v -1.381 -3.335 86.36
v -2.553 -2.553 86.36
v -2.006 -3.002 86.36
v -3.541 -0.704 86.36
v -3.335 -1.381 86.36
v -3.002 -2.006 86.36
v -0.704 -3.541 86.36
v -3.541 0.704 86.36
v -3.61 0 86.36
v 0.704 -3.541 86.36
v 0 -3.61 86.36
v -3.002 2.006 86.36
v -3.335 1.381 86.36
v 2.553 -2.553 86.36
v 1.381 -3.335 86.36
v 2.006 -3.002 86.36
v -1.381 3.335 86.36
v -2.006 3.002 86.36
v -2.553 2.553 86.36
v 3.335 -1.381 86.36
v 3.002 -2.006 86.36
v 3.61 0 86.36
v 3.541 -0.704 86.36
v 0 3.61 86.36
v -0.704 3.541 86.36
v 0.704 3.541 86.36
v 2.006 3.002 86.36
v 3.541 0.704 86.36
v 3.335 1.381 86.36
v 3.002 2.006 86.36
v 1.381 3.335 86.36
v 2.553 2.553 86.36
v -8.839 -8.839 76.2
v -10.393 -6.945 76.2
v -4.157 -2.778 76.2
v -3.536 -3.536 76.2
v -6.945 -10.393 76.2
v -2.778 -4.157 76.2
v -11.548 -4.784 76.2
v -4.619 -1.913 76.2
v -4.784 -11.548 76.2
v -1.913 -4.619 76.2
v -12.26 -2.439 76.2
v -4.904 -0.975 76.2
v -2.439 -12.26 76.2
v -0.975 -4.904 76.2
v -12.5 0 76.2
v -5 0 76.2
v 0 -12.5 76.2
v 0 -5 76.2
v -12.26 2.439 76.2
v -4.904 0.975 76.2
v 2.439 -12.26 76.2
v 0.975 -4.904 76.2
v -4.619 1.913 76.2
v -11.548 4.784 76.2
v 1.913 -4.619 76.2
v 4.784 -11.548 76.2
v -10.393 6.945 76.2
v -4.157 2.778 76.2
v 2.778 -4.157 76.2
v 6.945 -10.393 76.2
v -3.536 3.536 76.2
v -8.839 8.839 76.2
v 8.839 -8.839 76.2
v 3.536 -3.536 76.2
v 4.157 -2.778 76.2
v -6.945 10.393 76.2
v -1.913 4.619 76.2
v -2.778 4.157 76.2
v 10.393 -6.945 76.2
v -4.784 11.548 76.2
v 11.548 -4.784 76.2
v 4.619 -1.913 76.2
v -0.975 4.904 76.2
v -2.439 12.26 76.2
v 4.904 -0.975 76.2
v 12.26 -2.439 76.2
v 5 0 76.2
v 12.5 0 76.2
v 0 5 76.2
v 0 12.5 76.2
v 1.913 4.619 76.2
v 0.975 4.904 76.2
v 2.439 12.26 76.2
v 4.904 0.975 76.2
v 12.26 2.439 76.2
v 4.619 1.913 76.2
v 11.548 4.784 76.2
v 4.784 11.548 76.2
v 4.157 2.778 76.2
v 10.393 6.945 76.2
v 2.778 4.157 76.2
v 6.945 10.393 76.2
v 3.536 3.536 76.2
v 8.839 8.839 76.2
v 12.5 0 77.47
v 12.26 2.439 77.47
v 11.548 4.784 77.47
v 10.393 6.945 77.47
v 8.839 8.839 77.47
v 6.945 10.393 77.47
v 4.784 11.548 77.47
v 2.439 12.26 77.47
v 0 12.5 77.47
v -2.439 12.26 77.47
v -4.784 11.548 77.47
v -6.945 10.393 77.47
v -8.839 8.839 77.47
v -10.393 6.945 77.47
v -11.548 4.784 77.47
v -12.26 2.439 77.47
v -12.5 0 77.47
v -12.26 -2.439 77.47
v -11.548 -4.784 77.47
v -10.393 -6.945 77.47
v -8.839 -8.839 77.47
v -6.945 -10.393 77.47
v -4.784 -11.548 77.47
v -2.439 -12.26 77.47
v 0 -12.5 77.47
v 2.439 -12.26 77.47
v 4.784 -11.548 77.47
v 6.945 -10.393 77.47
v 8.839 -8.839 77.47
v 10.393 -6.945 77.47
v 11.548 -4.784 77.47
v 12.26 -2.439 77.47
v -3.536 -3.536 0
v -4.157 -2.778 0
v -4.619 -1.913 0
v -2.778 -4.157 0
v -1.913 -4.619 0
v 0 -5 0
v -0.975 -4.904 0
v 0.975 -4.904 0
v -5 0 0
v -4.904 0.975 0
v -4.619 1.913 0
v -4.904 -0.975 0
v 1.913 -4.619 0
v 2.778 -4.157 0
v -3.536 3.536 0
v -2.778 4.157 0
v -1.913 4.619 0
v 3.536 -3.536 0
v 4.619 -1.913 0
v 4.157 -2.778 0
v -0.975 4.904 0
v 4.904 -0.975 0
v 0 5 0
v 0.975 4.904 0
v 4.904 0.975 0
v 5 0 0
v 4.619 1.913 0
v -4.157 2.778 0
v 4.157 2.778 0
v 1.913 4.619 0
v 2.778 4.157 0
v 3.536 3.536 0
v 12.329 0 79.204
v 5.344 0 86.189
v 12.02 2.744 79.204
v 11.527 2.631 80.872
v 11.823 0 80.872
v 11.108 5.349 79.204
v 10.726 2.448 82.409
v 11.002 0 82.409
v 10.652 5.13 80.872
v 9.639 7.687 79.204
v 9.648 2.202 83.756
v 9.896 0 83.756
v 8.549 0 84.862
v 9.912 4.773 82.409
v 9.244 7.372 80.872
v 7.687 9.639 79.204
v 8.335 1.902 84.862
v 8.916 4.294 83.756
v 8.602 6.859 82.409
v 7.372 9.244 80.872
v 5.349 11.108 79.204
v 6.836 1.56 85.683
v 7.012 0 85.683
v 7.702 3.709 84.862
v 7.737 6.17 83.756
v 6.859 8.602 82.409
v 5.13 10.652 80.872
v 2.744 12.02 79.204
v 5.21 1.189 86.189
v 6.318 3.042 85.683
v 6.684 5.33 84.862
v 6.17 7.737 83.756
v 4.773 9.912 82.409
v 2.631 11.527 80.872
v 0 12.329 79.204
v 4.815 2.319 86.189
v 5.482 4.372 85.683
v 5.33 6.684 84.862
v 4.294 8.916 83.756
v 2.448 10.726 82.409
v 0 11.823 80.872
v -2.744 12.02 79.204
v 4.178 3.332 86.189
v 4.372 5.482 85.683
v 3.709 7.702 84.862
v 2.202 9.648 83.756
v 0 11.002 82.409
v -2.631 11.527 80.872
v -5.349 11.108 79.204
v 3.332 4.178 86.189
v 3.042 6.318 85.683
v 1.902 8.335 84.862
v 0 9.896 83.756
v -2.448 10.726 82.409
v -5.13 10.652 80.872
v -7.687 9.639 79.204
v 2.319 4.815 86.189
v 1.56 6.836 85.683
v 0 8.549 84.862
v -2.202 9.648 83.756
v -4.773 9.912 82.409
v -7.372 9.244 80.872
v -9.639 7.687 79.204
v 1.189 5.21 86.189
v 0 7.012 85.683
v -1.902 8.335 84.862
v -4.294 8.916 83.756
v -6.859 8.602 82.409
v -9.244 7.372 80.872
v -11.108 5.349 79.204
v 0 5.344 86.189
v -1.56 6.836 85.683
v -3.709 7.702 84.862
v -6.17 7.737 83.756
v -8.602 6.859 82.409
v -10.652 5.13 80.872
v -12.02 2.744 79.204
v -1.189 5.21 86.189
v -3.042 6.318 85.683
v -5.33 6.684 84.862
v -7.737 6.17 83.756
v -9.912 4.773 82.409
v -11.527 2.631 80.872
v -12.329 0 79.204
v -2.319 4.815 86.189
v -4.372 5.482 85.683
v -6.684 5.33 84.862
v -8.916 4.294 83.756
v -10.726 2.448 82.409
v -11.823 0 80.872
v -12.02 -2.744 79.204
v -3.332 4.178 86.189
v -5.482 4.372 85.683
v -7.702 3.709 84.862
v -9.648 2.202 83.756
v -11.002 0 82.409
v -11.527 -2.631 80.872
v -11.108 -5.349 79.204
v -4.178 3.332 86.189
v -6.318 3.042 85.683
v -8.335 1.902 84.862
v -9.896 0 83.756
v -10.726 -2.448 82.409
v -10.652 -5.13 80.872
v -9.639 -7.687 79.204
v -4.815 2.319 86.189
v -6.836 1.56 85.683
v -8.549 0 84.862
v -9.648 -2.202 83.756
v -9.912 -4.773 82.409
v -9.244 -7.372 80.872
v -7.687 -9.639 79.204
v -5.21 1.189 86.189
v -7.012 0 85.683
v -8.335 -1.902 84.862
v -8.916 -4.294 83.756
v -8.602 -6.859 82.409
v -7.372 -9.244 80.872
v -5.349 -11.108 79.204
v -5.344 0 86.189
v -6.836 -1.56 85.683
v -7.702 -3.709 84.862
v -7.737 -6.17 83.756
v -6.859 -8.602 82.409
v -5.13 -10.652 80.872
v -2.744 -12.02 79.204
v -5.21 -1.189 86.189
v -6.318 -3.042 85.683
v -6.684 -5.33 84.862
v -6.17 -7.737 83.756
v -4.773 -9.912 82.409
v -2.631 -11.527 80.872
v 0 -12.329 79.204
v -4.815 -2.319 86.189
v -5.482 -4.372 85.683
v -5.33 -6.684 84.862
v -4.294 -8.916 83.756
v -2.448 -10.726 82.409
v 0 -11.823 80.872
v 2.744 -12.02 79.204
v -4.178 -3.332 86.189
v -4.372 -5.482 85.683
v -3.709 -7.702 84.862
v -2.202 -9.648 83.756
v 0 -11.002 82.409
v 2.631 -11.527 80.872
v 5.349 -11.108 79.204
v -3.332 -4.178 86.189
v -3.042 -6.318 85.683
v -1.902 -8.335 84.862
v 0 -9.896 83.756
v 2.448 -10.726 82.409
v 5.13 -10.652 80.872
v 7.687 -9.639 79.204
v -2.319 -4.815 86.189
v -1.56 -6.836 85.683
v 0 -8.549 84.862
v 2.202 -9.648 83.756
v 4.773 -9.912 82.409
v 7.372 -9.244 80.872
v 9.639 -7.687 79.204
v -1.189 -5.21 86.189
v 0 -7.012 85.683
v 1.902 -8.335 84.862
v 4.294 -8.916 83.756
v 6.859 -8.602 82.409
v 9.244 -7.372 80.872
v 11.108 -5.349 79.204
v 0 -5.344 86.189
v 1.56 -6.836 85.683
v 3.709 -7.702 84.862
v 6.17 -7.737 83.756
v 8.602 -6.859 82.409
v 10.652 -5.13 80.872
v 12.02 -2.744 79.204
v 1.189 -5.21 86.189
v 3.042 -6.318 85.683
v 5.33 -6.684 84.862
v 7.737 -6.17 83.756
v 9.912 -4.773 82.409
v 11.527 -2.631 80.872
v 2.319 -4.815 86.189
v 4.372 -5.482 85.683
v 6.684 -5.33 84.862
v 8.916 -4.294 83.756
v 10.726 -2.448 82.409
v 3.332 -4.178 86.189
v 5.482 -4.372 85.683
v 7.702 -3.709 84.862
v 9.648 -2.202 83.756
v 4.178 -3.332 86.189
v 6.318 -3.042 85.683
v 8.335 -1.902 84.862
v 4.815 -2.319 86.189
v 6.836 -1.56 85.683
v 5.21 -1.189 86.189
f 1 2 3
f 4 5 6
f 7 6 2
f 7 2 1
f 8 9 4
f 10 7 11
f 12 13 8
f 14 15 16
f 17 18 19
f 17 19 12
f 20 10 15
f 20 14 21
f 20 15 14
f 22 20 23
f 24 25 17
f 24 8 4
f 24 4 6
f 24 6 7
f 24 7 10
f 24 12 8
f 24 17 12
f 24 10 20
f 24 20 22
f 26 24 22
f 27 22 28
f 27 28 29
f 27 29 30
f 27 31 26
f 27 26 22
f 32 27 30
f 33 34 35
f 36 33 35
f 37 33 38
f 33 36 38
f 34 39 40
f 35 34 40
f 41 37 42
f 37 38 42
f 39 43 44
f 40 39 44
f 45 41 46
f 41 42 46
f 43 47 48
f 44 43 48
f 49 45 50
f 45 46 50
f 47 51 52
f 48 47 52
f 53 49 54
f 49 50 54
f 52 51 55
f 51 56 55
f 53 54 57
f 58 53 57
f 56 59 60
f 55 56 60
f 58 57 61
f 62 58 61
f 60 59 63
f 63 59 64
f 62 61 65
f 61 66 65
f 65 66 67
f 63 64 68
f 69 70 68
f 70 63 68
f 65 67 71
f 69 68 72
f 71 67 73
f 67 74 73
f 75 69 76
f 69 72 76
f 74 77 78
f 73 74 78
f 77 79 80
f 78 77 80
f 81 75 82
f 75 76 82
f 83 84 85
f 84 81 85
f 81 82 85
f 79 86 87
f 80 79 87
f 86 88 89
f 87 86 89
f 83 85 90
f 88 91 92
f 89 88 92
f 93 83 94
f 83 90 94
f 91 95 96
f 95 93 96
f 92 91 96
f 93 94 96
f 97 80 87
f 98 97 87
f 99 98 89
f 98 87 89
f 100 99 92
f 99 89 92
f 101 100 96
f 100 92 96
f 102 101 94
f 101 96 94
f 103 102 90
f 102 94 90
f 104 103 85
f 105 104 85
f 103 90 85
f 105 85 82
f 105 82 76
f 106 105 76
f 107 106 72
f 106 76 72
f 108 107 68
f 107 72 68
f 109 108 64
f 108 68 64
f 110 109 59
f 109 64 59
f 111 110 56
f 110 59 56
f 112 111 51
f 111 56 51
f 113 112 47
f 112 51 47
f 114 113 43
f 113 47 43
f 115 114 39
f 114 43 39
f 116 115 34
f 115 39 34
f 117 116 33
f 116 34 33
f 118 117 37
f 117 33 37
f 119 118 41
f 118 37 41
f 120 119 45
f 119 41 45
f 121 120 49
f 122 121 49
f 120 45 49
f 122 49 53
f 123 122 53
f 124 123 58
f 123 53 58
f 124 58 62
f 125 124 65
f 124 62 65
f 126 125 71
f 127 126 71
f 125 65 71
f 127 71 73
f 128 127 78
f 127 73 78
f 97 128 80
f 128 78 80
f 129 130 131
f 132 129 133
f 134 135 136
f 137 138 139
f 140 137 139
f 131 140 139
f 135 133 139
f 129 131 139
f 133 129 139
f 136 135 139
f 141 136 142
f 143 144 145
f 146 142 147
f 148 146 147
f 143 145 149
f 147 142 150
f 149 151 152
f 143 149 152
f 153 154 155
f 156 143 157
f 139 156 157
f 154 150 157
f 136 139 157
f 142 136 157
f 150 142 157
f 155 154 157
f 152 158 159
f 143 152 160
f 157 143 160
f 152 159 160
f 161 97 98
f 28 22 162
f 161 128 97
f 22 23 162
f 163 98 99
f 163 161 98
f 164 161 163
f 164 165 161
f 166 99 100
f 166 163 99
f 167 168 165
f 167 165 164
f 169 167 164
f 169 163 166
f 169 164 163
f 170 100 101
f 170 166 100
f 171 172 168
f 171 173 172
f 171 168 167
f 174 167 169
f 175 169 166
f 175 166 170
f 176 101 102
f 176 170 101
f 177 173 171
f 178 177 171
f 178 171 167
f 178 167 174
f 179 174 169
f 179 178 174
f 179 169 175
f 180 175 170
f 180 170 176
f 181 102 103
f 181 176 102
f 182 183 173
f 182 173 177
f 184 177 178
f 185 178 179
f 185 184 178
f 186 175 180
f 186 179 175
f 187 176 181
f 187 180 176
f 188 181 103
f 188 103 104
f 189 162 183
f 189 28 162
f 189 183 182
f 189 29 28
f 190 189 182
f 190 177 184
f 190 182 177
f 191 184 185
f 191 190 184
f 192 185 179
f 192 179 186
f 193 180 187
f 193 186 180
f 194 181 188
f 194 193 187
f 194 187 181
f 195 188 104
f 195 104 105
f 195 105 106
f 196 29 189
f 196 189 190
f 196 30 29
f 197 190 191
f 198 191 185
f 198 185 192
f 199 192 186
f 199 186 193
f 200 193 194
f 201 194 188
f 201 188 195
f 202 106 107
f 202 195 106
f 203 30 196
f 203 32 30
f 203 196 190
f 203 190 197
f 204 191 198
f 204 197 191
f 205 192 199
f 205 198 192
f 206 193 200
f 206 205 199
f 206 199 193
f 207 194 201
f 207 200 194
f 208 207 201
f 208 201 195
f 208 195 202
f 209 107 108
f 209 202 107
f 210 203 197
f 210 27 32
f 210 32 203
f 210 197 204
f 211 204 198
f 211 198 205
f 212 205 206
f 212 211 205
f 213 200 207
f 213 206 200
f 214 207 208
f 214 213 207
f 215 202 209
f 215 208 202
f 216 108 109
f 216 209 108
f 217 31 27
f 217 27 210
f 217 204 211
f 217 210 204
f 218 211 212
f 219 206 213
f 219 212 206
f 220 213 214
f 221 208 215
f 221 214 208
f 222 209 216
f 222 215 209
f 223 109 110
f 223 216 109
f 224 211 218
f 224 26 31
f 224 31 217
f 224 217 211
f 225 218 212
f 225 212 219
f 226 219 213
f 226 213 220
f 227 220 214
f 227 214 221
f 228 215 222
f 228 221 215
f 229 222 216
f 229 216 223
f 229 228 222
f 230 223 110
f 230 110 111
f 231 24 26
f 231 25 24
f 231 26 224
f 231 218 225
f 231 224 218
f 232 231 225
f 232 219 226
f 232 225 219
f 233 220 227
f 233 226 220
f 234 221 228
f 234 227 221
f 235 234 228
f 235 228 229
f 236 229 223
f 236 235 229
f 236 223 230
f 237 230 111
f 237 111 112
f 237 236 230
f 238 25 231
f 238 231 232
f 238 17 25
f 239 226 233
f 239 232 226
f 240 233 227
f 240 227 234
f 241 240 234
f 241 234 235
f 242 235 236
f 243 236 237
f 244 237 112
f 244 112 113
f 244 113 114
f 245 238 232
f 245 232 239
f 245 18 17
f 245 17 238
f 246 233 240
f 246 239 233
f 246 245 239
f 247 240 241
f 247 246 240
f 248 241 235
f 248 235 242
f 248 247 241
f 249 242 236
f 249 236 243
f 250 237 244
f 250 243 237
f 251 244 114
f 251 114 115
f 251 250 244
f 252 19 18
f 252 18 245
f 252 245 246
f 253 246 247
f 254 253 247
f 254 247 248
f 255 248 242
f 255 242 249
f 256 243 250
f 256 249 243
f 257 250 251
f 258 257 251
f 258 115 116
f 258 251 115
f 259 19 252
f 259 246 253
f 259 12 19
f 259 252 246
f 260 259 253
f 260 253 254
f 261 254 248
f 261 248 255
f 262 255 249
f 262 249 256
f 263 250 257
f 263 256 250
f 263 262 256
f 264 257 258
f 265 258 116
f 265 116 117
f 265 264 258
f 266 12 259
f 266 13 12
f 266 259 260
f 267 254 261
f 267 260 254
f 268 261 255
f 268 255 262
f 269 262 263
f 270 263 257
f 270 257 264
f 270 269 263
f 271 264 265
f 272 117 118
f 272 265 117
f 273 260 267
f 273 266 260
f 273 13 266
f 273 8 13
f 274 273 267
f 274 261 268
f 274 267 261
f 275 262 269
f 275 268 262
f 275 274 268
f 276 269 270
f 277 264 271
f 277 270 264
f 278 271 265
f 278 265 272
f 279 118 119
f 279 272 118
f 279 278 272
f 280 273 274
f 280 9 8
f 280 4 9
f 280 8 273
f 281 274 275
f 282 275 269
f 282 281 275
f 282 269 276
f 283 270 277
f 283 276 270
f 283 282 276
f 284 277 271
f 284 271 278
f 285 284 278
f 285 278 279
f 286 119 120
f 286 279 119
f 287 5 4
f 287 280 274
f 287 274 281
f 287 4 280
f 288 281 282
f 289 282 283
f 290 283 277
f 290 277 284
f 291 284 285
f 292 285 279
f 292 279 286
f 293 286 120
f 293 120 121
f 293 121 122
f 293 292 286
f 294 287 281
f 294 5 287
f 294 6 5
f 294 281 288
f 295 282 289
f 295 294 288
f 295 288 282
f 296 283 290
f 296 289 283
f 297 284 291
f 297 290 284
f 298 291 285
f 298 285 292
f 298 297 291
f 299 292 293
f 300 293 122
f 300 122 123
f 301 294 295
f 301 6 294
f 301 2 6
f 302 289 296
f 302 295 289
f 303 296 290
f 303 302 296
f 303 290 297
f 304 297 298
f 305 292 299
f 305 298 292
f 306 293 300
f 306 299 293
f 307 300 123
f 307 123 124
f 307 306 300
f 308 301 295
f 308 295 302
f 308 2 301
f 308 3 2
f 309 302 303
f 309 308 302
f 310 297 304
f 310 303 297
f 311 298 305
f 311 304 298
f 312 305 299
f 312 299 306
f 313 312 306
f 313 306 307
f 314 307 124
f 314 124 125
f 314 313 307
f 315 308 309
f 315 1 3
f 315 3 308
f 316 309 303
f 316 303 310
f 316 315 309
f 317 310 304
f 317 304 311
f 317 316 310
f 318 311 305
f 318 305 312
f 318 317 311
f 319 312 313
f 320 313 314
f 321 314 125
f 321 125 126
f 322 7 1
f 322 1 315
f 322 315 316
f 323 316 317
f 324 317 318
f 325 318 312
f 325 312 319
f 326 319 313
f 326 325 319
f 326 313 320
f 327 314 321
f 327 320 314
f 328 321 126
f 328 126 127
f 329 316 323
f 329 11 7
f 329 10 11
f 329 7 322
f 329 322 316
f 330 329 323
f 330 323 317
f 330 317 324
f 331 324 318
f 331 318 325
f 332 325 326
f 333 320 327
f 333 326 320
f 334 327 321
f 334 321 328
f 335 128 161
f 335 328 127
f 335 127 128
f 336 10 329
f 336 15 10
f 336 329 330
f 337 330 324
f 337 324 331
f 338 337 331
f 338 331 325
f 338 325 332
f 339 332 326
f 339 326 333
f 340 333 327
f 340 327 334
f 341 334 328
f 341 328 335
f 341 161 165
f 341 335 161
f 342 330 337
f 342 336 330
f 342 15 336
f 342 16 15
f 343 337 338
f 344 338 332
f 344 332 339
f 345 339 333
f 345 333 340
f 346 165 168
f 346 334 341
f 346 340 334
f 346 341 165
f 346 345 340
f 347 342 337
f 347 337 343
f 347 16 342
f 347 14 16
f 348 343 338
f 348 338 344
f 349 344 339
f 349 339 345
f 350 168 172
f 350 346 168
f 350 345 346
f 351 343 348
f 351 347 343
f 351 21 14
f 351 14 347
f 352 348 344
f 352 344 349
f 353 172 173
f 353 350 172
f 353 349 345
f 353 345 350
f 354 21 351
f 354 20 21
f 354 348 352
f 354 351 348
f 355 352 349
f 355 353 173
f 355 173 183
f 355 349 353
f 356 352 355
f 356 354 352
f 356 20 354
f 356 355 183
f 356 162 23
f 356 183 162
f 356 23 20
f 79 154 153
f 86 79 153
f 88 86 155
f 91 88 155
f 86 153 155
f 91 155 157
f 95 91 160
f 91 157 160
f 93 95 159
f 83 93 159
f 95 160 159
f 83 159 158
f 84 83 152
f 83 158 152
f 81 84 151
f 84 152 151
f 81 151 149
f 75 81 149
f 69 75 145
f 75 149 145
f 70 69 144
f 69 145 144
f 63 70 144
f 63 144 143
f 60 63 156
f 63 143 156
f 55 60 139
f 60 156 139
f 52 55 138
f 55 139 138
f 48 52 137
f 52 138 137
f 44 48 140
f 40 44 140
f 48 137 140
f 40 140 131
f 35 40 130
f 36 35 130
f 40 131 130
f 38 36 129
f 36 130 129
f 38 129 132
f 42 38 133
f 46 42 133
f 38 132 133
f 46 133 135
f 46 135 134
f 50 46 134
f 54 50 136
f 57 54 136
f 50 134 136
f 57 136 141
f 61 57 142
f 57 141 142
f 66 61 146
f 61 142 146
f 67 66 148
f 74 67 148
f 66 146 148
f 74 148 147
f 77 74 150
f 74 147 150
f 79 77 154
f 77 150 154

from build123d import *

# Parameters (mm, degrees)
F0_R     = 5
F1_DEPTH = 76.2
F2_R     = 12.5
F2_R_2   = 5
F3_DEPTH = 10.16
F4_R     = 8.89


with BuildPart() as f1:
    # F0 (on Top) → F1 (new body)
    with BuildSketch(Plane.XY):
        Circle(F0_R)
    extrude(amount=F1_DEPTH)

    # F2 (on face) → F3 (join)
    with BuildSketch(Plane.XY.offset(76.2)):
        Circle(F2_R)
        Circle(F2_R_2, mode=Mode.SUBTRACT)
        Circle(F2_R_2)
    extrude(amount=F3_DEPTH)

    # F4
    f4_edges = [f1.edges().sort_by_distance(p)[0] for p in [
        (-12.5, 0, 86.36),
    ]]
    fillet(f4_edges, radius=F4_R)


solid = f1.part
